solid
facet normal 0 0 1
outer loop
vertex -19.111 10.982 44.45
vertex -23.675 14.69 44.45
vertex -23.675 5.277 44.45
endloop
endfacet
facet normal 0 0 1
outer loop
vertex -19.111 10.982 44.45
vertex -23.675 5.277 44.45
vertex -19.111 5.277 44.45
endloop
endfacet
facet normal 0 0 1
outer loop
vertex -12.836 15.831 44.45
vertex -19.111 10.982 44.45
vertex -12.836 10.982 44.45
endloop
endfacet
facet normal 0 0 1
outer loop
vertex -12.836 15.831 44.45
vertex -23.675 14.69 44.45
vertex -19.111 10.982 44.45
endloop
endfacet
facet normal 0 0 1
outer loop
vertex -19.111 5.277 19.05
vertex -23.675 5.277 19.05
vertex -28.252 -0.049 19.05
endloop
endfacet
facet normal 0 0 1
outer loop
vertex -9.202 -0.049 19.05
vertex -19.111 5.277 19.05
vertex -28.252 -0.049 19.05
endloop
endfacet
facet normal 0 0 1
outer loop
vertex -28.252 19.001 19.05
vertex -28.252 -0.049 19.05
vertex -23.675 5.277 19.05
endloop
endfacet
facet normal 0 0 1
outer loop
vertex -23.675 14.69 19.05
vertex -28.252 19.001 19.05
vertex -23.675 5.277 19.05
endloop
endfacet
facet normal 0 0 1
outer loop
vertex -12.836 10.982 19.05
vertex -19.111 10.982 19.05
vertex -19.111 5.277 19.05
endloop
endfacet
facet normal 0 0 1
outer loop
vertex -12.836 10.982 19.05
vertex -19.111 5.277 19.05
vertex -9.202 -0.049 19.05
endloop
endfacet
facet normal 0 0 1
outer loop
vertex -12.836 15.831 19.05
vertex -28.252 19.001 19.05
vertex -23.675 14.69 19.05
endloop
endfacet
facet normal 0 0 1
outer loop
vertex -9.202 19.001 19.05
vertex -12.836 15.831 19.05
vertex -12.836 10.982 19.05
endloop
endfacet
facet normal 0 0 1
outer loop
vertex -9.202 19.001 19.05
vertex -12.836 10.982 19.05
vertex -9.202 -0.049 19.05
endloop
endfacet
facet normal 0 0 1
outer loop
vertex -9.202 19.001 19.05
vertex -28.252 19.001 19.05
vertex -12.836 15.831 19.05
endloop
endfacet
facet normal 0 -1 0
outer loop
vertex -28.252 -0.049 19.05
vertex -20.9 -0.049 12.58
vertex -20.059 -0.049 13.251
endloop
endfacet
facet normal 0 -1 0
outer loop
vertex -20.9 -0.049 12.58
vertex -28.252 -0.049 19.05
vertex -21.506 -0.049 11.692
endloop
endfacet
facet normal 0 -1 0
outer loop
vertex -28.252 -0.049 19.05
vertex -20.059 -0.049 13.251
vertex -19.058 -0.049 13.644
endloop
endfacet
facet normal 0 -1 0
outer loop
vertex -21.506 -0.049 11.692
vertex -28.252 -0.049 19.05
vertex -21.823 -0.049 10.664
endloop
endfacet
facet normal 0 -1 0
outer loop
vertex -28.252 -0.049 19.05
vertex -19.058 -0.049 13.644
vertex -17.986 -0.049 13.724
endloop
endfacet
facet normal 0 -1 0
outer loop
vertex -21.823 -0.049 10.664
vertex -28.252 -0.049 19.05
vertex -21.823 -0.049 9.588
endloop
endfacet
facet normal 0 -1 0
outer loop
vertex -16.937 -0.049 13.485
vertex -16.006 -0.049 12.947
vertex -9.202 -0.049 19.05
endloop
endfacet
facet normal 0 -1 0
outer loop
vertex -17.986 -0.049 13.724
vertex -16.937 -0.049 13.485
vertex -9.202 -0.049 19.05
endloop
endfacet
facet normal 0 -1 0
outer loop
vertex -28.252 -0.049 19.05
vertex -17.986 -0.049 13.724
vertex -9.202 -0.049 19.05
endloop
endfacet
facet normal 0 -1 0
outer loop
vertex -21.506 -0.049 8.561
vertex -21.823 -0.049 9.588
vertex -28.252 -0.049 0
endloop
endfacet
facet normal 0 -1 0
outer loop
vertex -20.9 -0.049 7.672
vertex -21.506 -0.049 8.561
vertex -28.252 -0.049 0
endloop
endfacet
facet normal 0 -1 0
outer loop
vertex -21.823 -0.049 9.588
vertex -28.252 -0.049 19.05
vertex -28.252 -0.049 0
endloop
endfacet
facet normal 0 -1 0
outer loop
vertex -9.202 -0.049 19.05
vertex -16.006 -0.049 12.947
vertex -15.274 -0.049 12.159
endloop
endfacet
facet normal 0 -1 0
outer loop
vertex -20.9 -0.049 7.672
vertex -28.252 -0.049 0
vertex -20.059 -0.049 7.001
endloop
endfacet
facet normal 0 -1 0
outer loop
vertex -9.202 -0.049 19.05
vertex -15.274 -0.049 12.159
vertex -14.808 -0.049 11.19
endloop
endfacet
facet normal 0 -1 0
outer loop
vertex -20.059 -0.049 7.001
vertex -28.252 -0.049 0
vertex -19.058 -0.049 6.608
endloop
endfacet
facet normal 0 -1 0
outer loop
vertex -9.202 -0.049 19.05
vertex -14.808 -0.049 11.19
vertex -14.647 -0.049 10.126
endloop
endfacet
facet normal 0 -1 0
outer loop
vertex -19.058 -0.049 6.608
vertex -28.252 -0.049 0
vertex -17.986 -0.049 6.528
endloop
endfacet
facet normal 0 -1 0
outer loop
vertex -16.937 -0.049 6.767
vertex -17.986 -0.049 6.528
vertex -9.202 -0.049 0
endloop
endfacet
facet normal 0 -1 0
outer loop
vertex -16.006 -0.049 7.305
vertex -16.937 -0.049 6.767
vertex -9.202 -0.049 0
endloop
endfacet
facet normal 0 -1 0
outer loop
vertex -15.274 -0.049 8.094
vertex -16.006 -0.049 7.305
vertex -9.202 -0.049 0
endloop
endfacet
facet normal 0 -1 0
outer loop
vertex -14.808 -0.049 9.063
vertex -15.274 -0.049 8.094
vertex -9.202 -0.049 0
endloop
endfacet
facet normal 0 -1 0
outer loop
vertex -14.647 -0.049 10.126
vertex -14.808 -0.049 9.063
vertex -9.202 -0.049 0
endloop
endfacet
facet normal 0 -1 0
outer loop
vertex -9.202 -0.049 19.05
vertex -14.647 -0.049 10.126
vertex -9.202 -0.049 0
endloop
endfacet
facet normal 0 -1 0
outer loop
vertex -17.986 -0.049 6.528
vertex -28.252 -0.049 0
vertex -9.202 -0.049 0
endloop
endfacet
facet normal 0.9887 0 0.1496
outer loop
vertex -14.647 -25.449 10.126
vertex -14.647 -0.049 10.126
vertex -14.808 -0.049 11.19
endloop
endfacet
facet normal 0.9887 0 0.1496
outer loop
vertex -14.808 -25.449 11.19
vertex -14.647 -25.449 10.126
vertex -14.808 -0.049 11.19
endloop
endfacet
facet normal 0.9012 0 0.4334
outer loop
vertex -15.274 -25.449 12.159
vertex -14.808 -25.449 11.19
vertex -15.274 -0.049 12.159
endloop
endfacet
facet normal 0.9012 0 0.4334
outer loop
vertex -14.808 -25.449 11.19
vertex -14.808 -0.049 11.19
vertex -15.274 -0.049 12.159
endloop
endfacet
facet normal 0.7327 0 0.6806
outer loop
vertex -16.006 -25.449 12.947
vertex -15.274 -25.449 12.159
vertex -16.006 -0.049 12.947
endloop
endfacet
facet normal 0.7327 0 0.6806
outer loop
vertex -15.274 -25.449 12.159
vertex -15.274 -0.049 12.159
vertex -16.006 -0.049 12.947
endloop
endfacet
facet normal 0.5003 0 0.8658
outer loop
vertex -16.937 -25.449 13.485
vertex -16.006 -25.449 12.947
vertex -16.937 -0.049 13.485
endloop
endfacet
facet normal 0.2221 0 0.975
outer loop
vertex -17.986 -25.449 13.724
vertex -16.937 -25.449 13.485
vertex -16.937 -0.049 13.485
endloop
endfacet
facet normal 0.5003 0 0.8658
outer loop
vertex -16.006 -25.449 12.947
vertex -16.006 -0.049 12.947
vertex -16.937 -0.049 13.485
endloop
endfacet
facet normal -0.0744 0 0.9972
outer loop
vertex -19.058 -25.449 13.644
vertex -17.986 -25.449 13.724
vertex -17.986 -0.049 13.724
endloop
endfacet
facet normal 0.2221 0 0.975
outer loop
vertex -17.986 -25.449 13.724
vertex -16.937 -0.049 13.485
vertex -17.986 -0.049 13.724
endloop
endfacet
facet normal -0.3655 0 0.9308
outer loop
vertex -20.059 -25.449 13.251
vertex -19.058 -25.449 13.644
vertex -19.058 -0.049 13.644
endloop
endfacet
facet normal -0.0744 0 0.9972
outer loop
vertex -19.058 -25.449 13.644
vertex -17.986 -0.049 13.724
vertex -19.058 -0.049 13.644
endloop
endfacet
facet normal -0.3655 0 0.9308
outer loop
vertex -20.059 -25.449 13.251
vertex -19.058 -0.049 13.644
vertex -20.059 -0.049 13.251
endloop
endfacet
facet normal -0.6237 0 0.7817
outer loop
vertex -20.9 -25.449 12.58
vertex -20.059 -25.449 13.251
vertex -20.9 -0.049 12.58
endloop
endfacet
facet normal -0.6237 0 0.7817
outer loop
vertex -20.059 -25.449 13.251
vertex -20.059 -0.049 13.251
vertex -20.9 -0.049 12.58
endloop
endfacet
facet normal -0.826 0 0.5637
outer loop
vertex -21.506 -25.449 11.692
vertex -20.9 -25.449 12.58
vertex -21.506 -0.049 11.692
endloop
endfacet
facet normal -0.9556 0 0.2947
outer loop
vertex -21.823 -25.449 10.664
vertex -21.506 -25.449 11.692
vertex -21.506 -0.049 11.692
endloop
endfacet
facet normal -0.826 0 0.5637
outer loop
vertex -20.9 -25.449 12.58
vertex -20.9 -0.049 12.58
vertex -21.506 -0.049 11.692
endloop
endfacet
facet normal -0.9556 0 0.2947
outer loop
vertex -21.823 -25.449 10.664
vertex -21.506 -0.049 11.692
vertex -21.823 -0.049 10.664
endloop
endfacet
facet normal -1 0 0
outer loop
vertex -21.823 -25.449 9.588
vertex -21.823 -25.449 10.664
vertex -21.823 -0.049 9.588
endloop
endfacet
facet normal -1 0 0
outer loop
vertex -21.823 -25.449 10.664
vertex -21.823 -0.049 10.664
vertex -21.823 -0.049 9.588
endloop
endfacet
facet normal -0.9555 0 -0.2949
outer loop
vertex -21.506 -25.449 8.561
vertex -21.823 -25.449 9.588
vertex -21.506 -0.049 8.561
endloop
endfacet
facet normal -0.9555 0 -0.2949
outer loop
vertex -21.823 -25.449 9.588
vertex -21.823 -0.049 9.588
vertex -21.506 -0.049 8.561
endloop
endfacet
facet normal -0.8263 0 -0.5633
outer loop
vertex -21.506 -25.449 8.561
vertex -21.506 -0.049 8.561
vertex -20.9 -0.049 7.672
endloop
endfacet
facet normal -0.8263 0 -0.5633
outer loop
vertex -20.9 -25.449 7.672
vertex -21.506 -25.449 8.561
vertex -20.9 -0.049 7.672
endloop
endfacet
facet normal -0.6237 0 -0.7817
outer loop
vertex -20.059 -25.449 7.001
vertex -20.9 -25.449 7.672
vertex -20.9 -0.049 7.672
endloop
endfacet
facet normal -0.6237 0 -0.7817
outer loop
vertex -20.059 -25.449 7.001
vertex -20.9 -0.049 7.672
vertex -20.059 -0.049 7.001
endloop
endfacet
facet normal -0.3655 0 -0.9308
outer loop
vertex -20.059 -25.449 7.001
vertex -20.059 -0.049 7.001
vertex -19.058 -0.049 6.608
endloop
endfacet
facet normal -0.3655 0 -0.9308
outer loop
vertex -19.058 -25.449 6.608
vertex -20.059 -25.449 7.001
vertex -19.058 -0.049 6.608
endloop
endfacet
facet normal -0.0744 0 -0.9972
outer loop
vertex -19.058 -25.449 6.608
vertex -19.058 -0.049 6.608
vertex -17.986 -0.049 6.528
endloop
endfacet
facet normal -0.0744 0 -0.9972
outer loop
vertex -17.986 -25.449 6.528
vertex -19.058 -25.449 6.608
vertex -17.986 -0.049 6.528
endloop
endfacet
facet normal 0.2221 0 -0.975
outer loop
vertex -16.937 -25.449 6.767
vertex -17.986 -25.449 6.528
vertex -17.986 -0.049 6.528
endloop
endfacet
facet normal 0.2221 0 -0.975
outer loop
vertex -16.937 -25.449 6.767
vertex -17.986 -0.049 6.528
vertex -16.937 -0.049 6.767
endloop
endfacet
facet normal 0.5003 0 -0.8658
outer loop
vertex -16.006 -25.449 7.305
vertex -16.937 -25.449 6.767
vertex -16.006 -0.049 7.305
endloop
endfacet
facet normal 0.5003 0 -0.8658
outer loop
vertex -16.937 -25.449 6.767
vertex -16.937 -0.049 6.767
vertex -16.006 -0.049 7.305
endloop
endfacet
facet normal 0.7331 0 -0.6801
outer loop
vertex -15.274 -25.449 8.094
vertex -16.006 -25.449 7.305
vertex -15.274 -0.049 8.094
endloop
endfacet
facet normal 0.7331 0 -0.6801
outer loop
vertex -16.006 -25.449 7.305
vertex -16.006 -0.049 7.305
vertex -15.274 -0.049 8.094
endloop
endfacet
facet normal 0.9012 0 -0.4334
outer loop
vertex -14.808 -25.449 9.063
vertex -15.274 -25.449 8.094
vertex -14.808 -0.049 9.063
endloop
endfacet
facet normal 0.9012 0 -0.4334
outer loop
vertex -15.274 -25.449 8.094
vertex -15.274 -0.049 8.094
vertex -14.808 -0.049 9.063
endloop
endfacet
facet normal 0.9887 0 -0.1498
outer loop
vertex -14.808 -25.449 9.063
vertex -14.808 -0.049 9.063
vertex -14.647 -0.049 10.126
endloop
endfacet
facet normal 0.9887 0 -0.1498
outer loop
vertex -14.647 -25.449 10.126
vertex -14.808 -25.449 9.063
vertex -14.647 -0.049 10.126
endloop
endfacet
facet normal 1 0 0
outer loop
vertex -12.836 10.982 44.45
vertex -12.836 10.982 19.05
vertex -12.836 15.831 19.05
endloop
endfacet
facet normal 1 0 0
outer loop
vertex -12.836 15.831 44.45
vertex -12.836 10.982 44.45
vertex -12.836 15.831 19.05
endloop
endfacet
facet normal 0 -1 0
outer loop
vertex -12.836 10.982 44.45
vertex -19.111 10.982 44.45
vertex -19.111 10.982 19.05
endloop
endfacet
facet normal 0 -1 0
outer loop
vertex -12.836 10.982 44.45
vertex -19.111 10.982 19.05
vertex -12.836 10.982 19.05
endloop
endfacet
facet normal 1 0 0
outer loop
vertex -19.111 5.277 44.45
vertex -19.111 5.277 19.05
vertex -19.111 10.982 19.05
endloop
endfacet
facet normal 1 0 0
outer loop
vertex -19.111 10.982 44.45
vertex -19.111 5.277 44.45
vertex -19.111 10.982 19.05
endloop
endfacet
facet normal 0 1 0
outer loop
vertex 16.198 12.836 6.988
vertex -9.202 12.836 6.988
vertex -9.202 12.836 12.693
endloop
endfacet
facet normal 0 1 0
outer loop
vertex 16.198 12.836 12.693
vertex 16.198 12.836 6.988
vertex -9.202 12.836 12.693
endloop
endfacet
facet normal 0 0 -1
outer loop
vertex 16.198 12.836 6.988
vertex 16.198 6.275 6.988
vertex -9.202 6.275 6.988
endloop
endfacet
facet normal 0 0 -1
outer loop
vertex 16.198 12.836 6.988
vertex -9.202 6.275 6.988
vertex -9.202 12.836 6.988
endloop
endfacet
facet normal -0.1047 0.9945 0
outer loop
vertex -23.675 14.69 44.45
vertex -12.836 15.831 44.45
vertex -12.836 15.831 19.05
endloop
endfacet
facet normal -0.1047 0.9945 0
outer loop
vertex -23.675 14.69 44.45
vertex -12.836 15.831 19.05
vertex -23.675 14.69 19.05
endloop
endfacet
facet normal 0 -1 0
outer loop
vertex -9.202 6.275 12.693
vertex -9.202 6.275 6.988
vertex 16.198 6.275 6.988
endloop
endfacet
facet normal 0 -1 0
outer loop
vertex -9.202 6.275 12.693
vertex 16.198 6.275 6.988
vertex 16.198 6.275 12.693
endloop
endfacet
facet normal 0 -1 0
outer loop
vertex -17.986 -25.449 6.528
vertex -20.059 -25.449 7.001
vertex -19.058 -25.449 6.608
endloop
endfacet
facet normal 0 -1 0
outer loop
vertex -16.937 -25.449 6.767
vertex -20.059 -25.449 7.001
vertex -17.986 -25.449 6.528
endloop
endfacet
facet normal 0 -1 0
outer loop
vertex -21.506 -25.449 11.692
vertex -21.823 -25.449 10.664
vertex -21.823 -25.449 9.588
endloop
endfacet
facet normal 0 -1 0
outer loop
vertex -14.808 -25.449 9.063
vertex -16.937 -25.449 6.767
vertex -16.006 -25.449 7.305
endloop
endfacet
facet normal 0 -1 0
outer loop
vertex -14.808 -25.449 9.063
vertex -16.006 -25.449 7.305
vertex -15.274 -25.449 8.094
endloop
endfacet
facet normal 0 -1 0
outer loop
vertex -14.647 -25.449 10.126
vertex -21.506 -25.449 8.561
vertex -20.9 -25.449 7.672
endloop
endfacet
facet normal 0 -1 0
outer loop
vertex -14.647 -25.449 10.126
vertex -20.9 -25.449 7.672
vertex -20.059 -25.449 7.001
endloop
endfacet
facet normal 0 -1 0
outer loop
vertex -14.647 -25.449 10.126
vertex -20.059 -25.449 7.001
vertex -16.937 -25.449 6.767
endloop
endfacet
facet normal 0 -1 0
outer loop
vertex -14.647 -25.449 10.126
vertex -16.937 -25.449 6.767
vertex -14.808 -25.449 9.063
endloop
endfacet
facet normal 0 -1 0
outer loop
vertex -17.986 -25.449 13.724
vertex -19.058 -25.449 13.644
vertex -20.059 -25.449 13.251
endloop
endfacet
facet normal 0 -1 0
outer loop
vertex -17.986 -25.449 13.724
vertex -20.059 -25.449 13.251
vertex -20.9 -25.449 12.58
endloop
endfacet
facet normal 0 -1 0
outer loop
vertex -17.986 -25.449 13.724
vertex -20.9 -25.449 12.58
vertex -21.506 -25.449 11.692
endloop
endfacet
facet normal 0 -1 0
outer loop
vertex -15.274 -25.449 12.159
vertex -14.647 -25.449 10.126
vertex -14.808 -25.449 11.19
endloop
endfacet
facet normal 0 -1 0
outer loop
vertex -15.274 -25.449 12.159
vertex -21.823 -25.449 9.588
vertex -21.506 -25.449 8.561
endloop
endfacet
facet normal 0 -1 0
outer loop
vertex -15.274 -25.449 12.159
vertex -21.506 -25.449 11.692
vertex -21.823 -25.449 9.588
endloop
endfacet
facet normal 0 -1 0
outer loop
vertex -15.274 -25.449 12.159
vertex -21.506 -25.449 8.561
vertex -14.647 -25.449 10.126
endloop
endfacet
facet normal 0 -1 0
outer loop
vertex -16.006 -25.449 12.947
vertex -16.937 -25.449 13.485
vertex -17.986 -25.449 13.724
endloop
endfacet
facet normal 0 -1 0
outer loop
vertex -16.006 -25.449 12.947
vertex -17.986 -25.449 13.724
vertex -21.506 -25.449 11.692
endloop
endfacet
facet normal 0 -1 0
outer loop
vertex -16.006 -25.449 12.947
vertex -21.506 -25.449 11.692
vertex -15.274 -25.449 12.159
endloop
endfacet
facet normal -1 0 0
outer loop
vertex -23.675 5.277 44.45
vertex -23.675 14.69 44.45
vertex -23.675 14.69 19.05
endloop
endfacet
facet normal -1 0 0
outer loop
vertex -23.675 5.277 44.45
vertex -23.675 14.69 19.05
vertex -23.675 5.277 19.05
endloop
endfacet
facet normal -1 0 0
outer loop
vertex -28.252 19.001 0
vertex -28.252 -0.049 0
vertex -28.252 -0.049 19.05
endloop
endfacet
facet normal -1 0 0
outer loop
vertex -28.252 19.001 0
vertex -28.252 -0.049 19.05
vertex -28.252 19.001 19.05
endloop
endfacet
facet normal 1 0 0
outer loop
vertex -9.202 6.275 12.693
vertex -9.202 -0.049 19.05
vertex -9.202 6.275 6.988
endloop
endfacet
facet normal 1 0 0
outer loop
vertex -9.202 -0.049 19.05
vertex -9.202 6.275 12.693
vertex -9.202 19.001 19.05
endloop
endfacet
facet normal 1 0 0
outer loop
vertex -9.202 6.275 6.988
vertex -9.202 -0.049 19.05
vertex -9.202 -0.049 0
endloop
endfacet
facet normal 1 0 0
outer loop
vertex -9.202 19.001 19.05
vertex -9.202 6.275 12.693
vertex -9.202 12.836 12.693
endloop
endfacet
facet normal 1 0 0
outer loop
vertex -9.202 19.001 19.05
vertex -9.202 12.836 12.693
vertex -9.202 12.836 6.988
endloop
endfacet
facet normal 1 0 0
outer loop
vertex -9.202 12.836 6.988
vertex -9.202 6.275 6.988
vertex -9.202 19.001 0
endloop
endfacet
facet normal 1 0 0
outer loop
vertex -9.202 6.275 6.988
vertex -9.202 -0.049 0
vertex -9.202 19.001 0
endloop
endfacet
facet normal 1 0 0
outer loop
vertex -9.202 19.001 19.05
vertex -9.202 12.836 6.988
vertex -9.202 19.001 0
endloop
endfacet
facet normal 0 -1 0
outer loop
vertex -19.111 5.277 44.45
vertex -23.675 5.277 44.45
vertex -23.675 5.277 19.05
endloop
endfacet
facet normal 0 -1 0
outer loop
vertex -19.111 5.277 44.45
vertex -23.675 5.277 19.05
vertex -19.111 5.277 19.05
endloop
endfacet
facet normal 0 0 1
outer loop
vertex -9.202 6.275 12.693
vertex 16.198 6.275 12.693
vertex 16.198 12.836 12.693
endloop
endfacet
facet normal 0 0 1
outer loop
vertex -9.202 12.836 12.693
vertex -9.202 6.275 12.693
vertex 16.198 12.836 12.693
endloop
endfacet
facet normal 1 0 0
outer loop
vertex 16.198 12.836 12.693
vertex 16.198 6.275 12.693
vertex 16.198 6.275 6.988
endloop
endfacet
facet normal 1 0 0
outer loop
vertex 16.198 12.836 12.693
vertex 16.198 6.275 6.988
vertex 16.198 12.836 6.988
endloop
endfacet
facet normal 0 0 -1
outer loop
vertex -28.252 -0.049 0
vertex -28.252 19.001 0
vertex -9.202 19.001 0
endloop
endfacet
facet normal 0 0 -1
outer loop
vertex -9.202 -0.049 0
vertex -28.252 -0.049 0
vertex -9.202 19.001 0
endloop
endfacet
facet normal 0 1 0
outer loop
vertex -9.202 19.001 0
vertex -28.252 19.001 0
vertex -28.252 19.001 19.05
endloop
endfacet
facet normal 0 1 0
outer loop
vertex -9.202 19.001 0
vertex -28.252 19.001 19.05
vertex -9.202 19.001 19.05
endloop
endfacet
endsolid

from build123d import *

# Parameters (mm, degrees)
F0_W     = 19.05
F0_H     = 19.05
F1_DEPTH = 19.05
F2_R     = 3.608041
F3_DEPTH = 25.4
F4_W     = 6.560533
F4_H     = 5.704813
F5_DEPTH = 25.4
F7_DEPTH = 25.4


with BuildPart() as f1:
    # F0 (on Top) → F1 (new body)
    with BuildSketch(Plane.XY):
        with Locations((-18.726731, 9.476246)):
            Rectangle(F0_W, F0_H)
    extrude(amount=F1_DEPTH)

    # F2 (on face) → F3 (join)
    with BuildSketch(Plane.XZ.offset(0.048754)):
        with Locations((-18.255401, 10.126043)):
            Circle(F2_R)
    extrude(amount=F3_DEPTH)

    # F4 (on face) → F5 (join)
    with BuildSketch(Plane.YZ.offset(-9.201731)):
        with Locations((9.555563, 9.840802)):
            Rectangle(F4_W, F4_H)
    extrude(amount=F5_DEPTH)

    # F6 (on face) → F7 (join)
    with BuildSketch(Plane.XY.offset(19.05)):
        Polygon((-12.835828, 15.830856), (-23.674972, 14.689893), (-23.674972, 5.276952), (-19.111123, 5.276952), (-19.111123, 10.981766), (-12.835828, 10.981766), align=None)
    extrude(amount=F7_DEPTH)


solid = f1.part
